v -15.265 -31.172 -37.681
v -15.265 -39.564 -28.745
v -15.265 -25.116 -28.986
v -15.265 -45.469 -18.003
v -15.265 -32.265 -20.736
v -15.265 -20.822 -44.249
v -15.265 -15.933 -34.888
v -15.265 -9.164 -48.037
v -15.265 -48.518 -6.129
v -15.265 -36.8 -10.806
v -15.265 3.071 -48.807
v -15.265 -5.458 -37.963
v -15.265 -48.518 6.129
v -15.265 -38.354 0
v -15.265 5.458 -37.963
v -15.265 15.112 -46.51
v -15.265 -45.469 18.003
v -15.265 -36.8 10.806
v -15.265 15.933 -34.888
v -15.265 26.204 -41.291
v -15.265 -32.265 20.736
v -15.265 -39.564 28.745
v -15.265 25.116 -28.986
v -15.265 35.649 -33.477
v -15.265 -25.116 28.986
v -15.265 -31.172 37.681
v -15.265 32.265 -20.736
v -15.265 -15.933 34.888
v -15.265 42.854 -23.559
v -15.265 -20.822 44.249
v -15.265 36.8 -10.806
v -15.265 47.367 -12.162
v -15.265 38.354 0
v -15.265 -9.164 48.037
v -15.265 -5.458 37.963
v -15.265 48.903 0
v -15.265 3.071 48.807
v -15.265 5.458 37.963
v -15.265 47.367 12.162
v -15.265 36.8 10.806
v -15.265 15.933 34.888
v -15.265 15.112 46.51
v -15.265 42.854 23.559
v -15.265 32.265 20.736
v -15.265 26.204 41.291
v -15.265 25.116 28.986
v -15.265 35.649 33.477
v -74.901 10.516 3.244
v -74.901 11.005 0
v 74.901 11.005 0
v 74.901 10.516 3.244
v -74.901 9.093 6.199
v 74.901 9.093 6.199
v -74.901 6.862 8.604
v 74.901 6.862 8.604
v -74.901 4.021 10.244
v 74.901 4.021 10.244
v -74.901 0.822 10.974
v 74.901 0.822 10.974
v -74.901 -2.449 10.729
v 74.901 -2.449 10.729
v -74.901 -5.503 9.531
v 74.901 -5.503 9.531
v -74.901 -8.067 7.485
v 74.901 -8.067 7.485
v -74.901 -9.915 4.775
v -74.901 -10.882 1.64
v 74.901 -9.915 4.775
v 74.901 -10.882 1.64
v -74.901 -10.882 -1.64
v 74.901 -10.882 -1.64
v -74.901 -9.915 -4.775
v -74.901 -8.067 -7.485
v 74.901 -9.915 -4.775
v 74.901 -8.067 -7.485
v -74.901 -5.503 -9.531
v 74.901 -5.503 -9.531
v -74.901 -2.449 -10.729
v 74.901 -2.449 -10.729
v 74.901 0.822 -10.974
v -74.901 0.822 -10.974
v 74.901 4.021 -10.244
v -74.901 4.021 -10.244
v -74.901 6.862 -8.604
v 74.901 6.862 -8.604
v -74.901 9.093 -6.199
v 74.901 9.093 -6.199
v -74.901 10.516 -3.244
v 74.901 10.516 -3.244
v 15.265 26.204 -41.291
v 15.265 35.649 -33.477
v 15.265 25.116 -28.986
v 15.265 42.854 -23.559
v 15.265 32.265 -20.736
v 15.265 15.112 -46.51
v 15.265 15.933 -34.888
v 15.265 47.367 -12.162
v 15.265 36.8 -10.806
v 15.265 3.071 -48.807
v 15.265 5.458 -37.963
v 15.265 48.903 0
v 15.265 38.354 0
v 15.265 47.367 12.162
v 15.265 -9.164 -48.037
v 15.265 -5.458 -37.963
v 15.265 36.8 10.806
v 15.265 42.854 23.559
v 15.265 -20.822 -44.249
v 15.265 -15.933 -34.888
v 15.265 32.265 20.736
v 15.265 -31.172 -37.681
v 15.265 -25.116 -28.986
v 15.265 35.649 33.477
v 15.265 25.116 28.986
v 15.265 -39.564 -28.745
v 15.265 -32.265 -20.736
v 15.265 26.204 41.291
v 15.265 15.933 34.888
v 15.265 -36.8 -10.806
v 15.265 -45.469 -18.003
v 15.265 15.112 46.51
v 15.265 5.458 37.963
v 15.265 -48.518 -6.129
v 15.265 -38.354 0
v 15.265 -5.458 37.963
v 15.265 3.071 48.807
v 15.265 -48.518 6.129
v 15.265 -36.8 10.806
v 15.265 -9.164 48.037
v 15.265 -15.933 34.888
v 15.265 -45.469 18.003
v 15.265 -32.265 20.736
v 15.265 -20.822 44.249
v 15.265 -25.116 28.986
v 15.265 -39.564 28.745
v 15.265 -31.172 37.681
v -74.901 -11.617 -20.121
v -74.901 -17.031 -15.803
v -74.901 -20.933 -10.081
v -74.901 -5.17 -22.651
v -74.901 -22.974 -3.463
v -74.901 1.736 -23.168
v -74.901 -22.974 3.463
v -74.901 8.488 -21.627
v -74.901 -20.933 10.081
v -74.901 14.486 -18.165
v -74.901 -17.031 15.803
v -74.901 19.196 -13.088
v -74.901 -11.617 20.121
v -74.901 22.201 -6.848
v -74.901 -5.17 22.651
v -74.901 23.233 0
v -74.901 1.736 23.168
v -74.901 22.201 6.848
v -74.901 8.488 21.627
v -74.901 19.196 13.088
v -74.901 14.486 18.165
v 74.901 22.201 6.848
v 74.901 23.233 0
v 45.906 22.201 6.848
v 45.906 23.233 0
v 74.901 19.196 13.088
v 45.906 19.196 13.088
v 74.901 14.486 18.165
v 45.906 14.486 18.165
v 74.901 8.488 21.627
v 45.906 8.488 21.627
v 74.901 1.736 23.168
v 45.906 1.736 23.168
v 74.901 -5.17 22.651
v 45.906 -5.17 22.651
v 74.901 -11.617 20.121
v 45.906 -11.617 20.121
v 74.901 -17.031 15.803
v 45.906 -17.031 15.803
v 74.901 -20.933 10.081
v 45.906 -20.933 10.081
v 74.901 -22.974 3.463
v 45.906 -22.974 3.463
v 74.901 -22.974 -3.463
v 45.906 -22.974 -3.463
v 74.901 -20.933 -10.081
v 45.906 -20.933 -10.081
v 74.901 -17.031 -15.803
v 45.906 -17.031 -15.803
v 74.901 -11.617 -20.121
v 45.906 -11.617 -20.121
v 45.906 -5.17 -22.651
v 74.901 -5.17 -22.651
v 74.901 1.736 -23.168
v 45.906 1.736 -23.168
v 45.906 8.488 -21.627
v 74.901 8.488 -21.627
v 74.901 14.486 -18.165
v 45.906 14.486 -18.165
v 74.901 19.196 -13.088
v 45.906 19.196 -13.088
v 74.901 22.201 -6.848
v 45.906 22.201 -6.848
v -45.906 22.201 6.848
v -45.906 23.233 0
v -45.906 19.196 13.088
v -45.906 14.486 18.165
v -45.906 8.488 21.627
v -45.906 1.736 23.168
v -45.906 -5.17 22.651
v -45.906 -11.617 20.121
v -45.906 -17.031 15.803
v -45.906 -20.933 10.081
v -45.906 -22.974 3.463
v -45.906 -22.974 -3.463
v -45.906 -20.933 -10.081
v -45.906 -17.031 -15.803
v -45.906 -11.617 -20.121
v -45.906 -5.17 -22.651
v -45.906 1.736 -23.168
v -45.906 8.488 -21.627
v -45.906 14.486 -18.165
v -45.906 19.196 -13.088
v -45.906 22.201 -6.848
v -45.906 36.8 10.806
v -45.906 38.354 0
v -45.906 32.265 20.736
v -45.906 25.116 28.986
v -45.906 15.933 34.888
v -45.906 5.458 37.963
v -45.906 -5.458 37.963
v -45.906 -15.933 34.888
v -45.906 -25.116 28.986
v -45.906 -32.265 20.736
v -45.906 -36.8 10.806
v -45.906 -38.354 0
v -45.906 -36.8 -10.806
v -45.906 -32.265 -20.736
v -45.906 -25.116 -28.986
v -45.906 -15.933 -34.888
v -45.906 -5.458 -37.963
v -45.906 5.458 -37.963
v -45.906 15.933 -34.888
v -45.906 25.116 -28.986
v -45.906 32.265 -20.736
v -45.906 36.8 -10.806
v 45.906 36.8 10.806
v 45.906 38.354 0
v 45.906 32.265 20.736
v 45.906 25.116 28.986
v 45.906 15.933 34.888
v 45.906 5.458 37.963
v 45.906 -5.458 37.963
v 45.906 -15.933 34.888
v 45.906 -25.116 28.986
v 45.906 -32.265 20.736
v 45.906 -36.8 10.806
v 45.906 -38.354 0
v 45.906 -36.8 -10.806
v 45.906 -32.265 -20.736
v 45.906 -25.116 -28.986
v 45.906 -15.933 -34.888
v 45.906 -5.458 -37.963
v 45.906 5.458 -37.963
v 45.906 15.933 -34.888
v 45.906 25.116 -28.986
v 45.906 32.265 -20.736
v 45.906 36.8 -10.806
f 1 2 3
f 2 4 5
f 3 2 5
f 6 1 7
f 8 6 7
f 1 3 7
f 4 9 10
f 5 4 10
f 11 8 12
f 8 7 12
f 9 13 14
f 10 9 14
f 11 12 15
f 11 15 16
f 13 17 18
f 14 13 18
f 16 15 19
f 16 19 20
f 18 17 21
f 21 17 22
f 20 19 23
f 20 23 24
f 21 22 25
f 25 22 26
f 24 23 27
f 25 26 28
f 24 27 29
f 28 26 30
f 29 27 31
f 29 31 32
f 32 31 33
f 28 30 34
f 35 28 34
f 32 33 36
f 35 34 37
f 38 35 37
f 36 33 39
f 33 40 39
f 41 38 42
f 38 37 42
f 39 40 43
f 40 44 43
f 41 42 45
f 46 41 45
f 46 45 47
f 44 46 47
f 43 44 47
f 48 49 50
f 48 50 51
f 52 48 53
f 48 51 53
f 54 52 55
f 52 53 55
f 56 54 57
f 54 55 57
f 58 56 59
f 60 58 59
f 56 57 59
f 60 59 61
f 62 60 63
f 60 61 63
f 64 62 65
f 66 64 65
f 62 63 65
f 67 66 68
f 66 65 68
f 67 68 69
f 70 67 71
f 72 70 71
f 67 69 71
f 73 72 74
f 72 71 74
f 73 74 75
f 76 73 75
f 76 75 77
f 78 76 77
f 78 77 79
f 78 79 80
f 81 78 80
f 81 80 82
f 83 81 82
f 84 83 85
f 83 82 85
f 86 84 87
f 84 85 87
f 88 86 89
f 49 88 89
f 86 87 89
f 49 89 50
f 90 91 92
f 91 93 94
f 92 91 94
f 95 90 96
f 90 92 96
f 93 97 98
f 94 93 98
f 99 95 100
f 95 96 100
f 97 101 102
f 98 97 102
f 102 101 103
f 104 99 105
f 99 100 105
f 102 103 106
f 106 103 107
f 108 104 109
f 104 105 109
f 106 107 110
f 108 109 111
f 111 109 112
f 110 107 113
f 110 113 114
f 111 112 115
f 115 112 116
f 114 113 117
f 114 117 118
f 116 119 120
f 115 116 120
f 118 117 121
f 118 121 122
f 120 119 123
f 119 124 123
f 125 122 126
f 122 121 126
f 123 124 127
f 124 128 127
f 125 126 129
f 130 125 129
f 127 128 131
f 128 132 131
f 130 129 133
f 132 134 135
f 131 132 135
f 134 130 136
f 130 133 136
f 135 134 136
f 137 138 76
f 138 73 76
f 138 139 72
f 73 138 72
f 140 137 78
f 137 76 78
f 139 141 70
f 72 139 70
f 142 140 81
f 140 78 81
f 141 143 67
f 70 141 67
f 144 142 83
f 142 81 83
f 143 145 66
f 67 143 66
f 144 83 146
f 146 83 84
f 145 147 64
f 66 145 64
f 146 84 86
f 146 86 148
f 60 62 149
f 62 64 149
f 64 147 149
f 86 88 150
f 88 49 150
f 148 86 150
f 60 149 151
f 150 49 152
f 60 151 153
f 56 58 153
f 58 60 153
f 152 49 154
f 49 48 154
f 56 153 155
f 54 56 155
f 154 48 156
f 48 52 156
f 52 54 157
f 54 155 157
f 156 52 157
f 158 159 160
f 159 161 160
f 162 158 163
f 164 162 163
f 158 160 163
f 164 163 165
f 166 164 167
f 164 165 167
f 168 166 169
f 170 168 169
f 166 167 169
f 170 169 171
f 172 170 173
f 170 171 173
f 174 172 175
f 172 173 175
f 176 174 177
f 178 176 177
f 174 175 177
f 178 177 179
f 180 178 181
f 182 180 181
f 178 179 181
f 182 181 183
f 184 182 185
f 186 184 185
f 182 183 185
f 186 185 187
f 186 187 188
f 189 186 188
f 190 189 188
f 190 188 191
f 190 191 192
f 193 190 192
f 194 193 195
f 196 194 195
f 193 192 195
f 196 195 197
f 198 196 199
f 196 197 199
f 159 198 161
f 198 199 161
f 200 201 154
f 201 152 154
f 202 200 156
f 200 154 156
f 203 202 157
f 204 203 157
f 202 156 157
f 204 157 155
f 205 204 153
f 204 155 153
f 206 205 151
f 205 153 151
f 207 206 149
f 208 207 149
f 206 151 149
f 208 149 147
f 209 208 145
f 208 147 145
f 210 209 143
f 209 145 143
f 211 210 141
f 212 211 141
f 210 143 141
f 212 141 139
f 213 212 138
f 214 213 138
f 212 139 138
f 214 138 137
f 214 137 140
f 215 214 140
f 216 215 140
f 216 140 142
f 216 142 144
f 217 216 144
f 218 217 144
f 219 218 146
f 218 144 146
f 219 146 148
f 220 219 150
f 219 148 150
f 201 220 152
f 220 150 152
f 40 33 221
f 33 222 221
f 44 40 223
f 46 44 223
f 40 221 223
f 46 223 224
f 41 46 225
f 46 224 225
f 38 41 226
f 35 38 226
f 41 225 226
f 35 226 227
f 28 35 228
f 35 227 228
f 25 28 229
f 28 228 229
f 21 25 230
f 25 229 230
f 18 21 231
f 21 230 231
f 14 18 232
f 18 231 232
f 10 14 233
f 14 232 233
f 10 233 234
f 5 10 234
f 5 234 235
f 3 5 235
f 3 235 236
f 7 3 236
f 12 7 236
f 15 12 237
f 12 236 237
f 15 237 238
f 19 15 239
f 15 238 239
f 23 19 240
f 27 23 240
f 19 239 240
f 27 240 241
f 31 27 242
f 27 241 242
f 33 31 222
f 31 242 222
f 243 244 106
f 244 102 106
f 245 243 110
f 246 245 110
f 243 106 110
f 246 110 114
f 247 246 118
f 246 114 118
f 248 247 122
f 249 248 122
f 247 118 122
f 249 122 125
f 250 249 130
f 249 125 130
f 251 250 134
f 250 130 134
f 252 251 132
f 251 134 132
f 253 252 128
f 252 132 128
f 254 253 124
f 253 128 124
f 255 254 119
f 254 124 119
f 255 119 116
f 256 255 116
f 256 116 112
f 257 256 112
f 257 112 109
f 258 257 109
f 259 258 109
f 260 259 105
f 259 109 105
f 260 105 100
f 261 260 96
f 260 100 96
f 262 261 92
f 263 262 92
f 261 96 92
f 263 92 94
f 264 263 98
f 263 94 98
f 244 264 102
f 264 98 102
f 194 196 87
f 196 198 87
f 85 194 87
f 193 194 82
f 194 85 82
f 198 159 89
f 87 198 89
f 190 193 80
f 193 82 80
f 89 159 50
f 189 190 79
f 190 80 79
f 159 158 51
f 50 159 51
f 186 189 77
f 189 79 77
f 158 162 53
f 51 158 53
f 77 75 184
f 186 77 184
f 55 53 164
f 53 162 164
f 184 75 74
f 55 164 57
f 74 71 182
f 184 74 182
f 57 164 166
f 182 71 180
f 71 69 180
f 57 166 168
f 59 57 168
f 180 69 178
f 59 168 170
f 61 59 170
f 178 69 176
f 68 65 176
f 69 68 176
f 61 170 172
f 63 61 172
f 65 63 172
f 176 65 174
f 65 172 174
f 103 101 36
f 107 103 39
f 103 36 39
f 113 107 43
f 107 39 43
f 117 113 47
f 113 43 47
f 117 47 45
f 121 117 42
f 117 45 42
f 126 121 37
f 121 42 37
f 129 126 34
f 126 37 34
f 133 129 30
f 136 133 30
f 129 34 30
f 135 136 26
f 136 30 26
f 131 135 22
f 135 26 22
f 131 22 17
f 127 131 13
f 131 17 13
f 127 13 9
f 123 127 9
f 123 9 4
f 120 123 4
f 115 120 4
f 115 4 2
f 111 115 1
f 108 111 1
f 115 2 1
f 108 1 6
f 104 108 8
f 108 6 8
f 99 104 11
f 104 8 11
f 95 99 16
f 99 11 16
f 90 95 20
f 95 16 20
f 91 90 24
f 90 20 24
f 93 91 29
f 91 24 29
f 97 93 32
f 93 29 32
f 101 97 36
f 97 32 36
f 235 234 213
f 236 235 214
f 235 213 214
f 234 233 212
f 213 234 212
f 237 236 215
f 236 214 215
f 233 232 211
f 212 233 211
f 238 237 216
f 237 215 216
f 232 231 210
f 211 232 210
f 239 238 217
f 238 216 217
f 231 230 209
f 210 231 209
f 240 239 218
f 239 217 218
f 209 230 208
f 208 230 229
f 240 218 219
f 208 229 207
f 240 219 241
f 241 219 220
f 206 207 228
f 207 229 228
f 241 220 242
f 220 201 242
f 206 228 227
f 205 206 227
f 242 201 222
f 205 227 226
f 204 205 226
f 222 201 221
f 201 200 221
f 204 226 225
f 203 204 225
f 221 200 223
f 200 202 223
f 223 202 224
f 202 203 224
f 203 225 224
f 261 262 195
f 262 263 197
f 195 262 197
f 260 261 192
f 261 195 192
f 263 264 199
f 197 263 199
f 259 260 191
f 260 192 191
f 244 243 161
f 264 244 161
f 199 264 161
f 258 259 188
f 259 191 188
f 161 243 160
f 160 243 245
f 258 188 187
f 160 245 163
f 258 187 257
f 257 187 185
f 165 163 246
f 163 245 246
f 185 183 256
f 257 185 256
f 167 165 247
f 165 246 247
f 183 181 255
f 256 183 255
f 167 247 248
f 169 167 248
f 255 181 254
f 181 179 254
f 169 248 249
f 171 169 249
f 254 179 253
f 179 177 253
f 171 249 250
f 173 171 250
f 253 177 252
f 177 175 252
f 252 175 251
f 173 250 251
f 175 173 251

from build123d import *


with BuildPart() as f1:
    # F0 (on Top) → F1 (revolve)
    with BuildSketch(Plane.XY):
        Polygon((74.900694, 23.233382), (45.905843, 23.233382), (45.905843, 38.353771), (15.265487, 38.353771), (15.265487, 48.903458), (0, 48.903458), (0, 38.353771), (0, 11.005023), (45.905843, 11.005023), (74.900694, 11.005023), align=None)
        Polygon((-45.905843, 11.005023), (0, 11.005023), (0, 38.353771), (0, 48.903458), (-15.265487, 48.903458), (-15.265487, 38.353771), (-45.905843, 38.353771), (-45.905843, 23.233382), (-74.900694, 23.233382), (-74.900694, 11.005023), align=None)
    revolve(axis=Axis((-0.145569, 0, 0), (1, 0, 0)))


solid = f1.part
